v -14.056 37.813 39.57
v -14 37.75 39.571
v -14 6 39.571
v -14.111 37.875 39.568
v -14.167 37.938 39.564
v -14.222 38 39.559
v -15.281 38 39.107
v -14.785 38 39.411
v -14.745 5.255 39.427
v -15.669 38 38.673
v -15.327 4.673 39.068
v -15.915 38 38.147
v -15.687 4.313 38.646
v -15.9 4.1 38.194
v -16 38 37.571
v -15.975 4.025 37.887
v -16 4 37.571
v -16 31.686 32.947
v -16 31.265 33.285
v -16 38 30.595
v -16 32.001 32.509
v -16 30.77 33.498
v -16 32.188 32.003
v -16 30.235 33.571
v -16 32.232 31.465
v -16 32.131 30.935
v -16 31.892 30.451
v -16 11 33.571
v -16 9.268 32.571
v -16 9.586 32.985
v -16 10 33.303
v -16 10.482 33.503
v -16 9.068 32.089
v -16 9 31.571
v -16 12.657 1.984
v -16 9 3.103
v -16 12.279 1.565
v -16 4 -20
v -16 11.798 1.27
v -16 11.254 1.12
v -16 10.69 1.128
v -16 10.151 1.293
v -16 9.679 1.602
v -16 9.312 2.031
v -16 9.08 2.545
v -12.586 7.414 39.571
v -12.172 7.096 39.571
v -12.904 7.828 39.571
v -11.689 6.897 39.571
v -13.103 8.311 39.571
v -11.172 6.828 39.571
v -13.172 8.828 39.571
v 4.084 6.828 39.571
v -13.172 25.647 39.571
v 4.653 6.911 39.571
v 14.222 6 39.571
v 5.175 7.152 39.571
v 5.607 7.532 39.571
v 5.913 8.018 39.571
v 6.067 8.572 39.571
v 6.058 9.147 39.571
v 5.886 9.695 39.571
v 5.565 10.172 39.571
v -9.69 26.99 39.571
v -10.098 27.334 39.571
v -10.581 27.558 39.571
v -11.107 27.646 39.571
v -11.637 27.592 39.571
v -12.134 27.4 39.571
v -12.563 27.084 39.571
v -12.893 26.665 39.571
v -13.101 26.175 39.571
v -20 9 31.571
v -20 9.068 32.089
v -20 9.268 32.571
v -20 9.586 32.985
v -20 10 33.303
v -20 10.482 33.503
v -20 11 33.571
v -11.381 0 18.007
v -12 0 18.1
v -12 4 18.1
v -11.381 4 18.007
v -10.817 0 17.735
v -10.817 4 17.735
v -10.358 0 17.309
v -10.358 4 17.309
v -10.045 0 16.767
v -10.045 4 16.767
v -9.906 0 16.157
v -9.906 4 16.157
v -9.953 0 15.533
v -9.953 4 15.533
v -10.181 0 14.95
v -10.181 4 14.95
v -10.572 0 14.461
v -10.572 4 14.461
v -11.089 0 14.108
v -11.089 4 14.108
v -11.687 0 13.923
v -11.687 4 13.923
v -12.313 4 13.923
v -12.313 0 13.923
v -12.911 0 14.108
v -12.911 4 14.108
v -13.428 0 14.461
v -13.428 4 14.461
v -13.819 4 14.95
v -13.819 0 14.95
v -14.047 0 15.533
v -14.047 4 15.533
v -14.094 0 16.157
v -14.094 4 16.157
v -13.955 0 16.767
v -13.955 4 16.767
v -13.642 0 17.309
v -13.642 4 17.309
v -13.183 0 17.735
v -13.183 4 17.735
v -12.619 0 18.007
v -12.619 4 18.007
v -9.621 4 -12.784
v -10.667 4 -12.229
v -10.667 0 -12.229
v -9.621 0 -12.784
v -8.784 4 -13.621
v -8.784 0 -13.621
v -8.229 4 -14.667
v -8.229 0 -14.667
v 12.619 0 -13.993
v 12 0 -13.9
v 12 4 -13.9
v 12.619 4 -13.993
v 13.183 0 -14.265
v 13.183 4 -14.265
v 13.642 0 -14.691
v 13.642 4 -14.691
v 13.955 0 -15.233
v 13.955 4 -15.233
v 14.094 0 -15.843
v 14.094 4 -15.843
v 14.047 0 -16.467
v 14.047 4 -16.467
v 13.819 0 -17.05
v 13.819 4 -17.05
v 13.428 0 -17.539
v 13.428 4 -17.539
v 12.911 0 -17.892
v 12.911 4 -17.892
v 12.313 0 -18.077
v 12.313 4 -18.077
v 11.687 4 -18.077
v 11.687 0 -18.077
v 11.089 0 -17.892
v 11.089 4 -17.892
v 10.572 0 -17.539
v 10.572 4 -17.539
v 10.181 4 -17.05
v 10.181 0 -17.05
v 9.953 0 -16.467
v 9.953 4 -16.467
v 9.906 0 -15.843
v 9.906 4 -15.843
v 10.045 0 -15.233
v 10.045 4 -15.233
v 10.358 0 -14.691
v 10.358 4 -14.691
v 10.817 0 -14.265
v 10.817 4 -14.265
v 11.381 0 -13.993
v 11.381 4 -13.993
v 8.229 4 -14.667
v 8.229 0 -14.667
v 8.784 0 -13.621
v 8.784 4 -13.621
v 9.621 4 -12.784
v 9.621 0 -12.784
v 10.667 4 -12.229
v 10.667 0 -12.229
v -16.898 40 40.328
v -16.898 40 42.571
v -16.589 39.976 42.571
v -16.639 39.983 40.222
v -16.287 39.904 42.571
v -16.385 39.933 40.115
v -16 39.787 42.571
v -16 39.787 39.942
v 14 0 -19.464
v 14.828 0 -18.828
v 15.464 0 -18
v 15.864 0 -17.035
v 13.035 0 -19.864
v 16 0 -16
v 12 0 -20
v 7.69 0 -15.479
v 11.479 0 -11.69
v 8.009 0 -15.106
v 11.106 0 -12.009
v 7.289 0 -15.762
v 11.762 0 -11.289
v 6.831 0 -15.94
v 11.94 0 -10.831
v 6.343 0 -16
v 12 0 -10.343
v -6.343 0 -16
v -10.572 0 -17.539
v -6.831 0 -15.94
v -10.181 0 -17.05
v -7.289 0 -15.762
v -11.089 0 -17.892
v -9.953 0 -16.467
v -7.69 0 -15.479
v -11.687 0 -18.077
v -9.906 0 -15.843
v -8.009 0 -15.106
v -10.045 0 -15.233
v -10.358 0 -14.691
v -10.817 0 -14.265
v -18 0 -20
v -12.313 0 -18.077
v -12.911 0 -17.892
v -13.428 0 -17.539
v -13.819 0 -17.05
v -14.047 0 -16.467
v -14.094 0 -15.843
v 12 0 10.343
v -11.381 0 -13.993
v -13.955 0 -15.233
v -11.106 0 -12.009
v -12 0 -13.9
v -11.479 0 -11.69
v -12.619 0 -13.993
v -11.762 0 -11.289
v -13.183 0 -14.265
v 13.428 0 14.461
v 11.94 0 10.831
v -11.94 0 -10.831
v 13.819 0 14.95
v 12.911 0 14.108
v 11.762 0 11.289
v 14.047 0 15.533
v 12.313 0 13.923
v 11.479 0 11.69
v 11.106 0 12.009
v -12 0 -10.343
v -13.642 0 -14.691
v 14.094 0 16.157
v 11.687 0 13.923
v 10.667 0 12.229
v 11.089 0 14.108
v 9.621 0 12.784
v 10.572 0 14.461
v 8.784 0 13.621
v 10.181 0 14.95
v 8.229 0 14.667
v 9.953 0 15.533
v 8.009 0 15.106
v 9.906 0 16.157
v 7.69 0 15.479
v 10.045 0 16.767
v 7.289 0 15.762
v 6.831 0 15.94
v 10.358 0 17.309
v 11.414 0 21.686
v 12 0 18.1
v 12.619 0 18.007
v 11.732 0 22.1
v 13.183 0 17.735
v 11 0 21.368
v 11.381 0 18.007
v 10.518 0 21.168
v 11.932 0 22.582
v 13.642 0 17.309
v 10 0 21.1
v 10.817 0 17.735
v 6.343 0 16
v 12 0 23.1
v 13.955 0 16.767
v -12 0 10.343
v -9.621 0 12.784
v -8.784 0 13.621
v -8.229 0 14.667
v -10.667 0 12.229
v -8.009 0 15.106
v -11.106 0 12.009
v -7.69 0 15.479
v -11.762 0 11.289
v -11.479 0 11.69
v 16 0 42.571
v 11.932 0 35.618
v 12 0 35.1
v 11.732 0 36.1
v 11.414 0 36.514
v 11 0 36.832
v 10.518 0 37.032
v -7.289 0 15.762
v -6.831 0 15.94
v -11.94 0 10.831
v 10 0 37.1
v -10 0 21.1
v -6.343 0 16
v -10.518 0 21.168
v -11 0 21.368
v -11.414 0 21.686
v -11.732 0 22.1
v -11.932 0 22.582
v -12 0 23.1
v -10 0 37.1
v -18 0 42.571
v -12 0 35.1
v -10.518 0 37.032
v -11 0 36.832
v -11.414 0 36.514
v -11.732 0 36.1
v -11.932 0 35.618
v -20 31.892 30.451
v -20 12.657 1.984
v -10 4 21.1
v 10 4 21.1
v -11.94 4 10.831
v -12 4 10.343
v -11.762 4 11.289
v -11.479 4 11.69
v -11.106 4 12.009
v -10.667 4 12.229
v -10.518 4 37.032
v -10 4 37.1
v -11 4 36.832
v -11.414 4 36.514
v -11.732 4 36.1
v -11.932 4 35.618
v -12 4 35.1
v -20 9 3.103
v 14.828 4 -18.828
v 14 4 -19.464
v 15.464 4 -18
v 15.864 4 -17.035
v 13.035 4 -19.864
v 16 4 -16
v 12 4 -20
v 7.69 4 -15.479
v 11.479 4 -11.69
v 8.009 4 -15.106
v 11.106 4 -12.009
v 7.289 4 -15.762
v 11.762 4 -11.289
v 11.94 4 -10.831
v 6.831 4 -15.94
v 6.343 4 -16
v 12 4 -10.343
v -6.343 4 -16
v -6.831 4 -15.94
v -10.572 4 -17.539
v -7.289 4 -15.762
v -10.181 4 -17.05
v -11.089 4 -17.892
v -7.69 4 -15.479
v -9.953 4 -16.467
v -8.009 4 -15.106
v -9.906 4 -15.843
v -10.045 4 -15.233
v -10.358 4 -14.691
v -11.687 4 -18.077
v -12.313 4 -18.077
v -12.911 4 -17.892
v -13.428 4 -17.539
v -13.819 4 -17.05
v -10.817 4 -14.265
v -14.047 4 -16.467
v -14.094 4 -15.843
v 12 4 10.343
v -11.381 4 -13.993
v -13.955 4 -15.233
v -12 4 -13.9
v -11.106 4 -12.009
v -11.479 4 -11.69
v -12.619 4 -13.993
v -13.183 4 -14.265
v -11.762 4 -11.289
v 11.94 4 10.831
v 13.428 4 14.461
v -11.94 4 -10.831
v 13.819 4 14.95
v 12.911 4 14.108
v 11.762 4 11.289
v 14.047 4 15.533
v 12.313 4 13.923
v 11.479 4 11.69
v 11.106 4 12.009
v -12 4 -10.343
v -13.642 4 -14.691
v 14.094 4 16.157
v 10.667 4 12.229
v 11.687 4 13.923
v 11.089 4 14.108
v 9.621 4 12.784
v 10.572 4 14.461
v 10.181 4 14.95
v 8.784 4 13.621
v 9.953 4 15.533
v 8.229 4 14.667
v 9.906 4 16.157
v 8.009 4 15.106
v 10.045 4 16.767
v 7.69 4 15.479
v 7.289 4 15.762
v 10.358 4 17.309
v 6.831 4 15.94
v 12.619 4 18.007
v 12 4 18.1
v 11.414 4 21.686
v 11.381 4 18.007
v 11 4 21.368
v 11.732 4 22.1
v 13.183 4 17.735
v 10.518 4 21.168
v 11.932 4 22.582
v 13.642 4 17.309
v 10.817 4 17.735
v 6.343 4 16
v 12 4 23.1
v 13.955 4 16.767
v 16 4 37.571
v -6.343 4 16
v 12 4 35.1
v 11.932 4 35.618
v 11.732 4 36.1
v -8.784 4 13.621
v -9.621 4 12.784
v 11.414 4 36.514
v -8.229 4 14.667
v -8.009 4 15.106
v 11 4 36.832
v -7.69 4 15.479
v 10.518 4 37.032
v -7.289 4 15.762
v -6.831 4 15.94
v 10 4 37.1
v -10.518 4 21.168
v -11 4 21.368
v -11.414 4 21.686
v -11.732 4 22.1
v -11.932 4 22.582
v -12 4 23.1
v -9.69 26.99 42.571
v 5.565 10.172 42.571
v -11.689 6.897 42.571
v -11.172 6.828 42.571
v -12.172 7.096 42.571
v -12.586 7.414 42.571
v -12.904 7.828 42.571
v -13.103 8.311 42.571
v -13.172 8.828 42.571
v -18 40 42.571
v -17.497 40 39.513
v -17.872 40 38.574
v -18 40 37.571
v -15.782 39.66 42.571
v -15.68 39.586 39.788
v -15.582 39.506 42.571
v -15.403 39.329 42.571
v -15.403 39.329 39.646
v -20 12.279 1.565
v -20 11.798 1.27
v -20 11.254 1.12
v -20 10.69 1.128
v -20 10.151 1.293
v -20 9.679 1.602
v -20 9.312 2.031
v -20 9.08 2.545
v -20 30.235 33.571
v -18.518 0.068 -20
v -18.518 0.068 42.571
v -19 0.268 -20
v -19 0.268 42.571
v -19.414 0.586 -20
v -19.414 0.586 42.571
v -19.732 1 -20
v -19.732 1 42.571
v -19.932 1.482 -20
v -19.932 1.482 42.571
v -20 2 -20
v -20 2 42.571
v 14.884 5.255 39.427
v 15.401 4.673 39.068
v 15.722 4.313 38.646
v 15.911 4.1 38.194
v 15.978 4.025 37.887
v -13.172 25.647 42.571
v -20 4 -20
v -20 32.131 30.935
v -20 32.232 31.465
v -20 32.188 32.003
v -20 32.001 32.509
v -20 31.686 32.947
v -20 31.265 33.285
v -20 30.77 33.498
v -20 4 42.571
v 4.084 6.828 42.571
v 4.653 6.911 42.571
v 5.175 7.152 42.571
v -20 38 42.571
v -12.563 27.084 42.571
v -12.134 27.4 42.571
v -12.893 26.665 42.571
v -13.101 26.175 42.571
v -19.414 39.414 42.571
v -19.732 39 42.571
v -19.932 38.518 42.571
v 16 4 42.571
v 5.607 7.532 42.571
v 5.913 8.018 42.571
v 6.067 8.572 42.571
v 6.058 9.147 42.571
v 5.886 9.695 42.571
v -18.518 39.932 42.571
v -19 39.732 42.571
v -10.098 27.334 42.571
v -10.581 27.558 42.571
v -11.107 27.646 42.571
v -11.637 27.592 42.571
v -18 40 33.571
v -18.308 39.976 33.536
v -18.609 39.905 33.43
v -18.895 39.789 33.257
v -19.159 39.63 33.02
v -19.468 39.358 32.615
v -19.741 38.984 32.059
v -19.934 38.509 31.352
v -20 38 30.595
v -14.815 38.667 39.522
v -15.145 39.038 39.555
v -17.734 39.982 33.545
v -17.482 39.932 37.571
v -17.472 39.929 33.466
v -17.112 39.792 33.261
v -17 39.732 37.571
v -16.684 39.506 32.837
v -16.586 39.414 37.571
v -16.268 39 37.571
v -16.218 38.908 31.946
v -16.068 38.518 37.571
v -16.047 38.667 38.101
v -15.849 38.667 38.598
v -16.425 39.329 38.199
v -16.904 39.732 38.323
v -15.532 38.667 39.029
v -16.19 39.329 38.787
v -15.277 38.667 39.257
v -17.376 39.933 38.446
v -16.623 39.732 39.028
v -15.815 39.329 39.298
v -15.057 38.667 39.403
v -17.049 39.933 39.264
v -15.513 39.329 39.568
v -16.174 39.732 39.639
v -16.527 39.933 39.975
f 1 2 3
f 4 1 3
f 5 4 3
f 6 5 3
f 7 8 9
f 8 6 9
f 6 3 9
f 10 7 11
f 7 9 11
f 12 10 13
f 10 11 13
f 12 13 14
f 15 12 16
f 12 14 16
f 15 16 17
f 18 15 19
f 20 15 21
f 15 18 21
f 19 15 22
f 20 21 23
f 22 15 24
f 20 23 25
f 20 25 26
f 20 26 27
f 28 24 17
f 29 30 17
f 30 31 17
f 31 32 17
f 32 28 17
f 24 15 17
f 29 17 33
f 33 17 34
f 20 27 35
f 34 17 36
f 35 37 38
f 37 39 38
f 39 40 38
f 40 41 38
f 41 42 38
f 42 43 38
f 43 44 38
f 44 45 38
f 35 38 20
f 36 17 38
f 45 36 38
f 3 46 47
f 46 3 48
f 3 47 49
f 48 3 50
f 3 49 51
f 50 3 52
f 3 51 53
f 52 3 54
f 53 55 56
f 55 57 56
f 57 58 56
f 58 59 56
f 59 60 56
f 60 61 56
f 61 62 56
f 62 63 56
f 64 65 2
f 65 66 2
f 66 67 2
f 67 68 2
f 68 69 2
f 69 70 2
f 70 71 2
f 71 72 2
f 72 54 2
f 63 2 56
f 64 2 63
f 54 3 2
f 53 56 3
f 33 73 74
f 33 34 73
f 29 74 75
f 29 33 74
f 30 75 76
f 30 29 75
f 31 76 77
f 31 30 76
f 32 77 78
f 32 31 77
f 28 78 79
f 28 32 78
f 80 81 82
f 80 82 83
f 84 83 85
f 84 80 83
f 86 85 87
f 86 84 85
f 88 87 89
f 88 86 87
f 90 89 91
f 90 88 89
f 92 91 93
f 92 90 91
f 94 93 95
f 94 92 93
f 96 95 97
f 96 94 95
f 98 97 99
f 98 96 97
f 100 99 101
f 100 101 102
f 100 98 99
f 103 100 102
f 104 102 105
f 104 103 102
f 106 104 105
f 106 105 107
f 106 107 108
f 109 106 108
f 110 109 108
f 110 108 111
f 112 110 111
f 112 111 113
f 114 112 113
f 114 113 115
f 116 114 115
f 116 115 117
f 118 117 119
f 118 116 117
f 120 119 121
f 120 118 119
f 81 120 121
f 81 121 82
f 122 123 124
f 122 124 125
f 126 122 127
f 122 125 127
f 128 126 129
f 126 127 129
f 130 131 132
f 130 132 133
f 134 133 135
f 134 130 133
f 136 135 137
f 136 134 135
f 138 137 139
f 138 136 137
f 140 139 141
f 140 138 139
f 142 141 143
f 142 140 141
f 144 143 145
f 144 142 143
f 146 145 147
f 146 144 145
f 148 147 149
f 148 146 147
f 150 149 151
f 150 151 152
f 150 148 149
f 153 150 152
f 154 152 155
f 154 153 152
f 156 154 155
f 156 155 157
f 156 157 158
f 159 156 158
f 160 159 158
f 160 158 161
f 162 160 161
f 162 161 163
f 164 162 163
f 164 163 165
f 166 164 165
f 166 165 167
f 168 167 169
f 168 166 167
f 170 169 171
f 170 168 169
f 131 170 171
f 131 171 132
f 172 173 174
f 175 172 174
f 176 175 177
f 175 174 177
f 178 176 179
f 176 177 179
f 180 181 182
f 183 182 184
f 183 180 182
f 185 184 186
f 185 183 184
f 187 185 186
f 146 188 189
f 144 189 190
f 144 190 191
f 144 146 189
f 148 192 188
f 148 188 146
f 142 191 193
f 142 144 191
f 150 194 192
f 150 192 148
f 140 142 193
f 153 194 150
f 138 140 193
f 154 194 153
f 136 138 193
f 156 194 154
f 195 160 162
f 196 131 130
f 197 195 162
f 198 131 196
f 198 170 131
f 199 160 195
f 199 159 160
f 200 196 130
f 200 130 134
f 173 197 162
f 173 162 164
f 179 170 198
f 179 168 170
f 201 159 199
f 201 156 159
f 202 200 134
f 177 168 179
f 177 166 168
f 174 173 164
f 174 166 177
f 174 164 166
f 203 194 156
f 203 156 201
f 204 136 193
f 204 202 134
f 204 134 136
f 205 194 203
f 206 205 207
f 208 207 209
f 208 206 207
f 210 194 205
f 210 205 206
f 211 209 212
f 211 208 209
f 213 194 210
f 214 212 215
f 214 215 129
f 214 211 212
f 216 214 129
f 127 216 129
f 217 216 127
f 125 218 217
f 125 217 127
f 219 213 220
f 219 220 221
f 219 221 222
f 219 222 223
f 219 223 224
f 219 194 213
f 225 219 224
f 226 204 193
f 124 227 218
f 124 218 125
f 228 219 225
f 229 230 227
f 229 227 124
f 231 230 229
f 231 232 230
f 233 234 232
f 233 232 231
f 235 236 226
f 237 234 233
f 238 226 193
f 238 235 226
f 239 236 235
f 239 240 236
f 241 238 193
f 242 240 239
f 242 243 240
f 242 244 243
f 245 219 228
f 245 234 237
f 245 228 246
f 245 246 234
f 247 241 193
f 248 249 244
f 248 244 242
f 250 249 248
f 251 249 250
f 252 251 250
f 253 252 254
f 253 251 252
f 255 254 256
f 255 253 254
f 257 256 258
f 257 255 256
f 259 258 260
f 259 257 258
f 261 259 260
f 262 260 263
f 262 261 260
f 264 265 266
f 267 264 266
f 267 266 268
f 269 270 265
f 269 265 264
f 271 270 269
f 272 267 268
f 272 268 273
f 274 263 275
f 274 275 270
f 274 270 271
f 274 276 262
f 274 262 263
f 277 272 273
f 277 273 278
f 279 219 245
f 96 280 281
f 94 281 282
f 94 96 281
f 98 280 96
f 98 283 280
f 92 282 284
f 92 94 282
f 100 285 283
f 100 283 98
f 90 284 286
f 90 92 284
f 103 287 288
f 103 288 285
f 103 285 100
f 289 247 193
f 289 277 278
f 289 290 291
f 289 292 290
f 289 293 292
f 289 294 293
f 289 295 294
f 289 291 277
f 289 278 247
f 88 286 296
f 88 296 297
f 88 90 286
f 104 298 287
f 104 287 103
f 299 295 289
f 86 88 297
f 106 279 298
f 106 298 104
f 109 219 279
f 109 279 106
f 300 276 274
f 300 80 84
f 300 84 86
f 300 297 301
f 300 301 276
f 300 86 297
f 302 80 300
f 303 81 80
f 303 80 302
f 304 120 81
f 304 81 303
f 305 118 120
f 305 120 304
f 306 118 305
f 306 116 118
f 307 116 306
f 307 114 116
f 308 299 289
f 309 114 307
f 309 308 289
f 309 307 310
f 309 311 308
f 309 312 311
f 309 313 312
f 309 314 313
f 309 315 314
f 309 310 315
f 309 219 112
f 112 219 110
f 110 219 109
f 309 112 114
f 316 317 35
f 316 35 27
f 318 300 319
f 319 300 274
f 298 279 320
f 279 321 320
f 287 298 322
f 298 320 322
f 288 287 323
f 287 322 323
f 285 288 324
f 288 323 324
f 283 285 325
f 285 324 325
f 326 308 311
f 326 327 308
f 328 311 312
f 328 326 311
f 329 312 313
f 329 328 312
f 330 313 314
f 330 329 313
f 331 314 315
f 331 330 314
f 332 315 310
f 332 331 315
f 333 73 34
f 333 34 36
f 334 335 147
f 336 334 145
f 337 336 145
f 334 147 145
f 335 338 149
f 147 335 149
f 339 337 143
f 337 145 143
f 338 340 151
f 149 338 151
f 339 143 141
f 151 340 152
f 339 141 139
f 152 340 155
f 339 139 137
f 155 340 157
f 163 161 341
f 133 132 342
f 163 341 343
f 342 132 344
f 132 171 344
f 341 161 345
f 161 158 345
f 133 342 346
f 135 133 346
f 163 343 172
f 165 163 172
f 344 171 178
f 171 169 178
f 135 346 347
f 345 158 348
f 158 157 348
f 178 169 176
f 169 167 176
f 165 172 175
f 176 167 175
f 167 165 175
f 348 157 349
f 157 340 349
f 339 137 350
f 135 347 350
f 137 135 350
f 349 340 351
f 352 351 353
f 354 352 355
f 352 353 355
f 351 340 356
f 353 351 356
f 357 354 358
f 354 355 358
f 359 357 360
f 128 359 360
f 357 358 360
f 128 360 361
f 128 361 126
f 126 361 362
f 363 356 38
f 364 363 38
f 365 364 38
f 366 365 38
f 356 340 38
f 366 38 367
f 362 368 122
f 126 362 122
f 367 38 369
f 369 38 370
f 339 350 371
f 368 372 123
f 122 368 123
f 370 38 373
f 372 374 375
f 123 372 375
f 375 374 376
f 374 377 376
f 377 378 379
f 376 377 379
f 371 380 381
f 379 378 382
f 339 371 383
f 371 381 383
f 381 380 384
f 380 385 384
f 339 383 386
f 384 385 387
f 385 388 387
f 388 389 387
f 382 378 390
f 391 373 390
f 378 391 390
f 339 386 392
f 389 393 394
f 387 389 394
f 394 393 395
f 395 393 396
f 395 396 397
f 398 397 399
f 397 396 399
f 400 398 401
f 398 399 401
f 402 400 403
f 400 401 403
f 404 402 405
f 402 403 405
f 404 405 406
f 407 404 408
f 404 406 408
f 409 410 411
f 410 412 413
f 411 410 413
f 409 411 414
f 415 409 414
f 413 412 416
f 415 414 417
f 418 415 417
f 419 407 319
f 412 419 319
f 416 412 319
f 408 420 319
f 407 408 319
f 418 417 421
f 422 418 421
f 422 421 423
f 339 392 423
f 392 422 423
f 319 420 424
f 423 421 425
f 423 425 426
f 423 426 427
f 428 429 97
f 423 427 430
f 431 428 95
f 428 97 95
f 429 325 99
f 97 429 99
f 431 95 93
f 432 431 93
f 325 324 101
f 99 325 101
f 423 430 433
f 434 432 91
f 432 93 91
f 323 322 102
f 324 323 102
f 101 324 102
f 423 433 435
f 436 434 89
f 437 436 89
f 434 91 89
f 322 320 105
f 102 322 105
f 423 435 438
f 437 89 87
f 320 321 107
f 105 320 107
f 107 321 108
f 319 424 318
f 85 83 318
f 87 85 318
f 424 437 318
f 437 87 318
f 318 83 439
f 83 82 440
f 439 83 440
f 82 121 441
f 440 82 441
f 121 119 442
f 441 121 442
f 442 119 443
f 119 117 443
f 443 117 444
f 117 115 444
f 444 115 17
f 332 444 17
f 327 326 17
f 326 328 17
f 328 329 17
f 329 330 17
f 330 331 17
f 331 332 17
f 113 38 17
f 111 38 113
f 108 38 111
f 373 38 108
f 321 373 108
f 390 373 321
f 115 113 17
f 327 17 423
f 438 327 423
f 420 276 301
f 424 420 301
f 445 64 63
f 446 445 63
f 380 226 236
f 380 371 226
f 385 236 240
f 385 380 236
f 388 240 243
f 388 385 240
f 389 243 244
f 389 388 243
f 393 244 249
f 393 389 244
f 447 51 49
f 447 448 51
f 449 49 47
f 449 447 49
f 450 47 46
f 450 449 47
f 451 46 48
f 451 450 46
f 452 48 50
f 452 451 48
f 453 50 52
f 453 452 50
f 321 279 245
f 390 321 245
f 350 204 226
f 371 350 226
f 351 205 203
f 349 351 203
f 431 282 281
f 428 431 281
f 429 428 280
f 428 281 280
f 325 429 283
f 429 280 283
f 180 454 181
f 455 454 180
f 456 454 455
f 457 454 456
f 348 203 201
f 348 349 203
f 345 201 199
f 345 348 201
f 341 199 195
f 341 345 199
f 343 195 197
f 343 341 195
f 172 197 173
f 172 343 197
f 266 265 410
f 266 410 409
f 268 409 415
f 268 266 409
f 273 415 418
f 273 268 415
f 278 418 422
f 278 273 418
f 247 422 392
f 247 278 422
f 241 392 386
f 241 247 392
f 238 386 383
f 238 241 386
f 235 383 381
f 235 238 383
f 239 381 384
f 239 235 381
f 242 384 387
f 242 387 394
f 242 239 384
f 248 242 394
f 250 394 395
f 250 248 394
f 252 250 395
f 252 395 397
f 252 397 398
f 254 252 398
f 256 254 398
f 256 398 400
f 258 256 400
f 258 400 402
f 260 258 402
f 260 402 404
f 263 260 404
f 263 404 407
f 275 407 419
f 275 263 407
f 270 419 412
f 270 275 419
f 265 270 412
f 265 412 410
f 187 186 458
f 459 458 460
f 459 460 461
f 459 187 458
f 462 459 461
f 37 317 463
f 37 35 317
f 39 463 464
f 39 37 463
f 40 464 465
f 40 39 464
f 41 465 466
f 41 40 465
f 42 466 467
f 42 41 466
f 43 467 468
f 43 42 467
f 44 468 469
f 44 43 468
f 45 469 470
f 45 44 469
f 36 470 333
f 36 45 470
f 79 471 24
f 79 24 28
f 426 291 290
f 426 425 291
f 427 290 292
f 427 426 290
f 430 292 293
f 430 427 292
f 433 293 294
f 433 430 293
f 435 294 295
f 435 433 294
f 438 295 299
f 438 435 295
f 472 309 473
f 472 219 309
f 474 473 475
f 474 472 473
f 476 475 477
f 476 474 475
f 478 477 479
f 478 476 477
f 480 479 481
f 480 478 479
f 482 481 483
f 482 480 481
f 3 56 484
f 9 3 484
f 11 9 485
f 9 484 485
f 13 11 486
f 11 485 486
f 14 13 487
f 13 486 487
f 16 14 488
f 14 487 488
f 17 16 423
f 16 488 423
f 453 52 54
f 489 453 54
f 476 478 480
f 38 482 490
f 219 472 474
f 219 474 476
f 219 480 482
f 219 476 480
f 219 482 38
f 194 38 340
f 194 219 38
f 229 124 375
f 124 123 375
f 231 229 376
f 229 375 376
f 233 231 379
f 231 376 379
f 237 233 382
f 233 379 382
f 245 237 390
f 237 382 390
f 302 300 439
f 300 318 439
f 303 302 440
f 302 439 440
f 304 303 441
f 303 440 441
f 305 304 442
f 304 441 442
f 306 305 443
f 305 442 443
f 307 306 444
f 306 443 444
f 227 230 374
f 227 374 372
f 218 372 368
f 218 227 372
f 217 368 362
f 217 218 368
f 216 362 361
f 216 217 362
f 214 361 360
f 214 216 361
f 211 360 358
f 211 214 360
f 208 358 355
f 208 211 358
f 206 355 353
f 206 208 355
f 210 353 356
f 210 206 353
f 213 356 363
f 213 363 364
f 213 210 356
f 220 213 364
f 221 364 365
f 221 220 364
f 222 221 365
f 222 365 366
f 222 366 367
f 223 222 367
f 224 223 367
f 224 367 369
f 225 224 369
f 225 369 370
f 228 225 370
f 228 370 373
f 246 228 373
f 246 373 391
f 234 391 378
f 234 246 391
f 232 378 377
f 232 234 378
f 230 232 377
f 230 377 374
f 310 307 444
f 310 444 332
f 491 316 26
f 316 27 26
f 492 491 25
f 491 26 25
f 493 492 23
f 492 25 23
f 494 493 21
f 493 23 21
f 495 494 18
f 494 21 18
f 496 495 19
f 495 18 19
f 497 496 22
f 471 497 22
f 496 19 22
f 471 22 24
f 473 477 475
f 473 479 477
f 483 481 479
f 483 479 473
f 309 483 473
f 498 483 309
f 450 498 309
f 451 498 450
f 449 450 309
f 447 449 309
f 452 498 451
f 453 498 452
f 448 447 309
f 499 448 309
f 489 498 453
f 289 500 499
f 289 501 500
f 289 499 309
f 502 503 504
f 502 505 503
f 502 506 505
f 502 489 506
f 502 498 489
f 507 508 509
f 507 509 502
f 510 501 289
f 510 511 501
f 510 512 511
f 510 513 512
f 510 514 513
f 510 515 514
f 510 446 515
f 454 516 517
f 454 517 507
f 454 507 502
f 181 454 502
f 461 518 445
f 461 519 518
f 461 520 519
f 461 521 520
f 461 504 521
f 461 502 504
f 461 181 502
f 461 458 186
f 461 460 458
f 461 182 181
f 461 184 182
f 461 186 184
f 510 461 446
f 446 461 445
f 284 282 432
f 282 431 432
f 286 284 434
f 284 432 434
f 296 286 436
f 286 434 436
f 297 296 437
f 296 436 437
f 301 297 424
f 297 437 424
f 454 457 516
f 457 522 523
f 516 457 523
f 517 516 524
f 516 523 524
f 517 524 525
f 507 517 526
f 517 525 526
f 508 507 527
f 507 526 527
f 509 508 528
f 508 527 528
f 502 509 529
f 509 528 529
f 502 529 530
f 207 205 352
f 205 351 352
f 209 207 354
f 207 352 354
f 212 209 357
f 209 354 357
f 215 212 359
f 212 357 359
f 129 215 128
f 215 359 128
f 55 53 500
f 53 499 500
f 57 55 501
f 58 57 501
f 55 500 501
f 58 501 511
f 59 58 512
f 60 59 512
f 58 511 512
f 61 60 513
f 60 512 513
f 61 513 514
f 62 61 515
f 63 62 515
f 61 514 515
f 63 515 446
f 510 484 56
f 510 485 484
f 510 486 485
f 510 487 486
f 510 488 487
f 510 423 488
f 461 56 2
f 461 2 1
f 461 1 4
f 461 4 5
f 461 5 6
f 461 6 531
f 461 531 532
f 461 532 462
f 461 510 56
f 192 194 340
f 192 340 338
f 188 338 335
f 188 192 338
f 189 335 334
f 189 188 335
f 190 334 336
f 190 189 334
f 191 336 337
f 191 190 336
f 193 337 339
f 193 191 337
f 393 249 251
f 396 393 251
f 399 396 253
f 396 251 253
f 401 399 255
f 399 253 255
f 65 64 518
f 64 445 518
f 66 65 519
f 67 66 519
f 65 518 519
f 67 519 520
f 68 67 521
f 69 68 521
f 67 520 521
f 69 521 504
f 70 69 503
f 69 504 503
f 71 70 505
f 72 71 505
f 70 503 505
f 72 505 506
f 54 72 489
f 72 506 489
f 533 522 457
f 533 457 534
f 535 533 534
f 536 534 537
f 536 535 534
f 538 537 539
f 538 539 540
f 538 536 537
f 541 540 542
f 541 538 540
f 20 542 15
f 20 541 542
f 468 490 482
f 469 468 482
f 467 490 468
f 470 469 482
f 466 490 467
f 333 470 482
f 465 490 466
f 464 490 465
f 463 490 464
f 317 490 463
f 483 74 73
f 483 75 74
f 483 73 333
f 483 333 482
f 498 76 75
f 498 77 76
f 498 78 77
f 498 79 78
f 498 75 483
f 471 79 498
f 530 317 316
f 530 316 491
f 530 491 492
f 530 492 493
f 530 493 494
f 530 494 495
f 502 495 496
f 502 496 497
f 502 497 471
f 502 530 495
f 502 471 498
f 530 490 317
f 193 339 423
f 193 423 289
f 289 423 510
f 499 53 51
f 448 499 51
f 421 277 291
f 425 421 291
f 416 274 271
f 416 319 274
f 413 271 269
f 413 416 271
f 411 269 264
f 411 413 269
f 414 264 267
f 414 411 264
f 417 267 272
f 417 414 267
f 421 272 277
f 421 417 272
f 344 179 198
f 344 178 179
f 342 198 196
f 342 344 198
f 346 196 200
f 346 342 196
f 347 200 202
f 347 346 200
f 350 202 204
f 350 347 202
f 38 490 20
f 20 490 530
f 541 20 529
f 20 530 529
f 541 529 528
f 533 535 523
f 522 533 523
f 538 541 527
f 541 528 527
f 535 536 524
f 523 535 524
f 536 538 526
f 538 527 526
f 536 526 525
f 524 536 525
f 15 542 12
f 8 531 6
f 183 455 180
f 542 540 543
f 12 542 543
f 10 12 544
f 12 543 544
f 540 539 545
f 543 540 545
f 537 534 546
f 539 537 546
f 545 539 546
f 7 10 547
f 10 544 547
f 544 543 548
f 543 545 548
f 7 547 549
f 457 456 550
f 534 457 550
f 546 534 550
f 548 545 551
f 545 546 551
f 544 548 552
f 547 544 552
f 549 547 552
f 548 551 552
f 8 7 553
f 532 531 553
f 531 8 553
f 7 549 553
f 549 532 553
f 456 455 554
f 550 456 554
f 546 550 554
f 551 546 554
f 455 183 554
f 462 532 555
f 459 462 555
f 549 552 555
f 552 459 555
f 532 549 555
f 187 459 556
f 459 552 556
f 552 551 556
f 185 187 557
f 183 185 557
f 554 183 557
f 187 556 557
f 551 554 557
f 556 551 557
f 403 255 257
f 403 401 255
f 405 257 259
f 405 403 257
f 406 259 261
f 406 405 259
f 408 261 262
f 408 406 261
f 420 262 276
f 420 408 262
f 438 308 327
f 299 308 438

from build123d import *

# Parameters (mm, degrees)
SKETCH1_R           = 2.1
BOSS_EXTRUDE1_DEPTH = 4
SKETCH2_W           = 4
SKETCH2_H           = 79.366859707
BOSS_EXTRUDE2_DEPTH = 36
SKETCH3_W           = 16.795845367
SKETCH3_H           = 36
CUT_EXTRUDE1_DEPTH  = 20
SKETCH4_W           = 16
SKETCH4_H           = 4
BOSS_EXTRUDE3_DEPTH = 36
CUT_EXTRUDE2_DEPTH  = 20
BOSS_EXTRUDE4_DEPTH = 3
CUT_EXTRUDE3_DEPTH  = 3
SKETCH9_W           = 24
SKETCH9_H           = 16
CUT_EXTRUDE5_DEPTH  = 4
FILLET1_R           = 2
FILLET2_R           = 2
FILLET3_START       = -20
FILLET3_DEPTH       = 57.57101424
FILLET3_START_2     = 35.417415549
FILLET3_2_DEPTH     = 8.582584451
FILLET3_START_3     = 39
FILLET3_4_DEPTH     = 5


with BuildPart() as part:
    # Sketch1 → Boss-Extrude1 (new body)
    with BuildSketch(Plane(origin=(0, 0, 0), x_dir=(1, 0, 0), z_dir=(0, 1, 0))):
        with BuildLine():
            Line((-12, 20), (12, 20))
            ThreePointArc((12, 20), (14.828427125, 18.828427125), (16, 16))
            Line((16, 16), (16, -16))
            Line((16, -16), (16, -26.57101434))
            Line((16, -26.57101434), (-16, -26.57101434))
            Line((-16, -26.57101434), (-20, -26.57101434))
            Line((-20, -26.57101434), (-20, 20))
            Line((-20, 20), (-12, 20))
        make_face()
        with Locations(Location((-12, 16, 0), (0, 0, 270))):
            Circle(SKETCH1_R, mode=Mode.SUBTRACT)
        with Locations(Location((12, 16, 0), (0, 0, 270))):
            Circle(SKETCH1_R, mode=Mode.SUBTRACT)
        with Locations(Location((12, -16, 0), (0, 0, 270))):
            Circle(SKETCH1_R, mode=Mode.SUBTRACT)
        with Locations(Location((-12, -16, 0), (0, 0, 270))):
            Circle(SKETCH1_R, mode=Mode.SUBTRACT)
        with BuildLine():
            Line((-8, 16), (8, 16))
            ThreePointArc((8, 16), (9.171572875, 13.171572875), (12, 12))
            Line((12, 12), (12, -12))
            ThreePointArc((12, -12), (9.171572875, -13.171572875), (8, -16))
            Line((8, -16), (-8, -16))
            ThreePointArc((-8, -16), (-9.171572875, -13.171572875), (-12, -12))
            Line((-12, -12), (-12, 12))
            ThreePointArc((-12, 12), (-9.171572875, 13.171572875), (-8, 16))
        make_face(mode=Mode.SUBTRACT)
    extrude(amount=BOSS_EXTRUDE1_DEPTH)

    # Sketch2 → Boss-Extrude2 (add)
    with BuildSketch(Plane(origin=(0, 4, 0), x_dir=(1, 0, 0), z_dir=(0, 1, 0))):
        with Locations((-18, -19.683429854)):
            Rectangle(SKETCH2_W, SKETCH2_H)
    extrude(amount=BOSS_EXTRUDE2_DEPTH)

    # Sketch3 → Cut-Extrude1 (cut)
    with BuildSketch(Plane.ZY.offset(20)):
        Polygon((-20, 4), (33.57101434, 40), (-20, 40), align=None)
        with Locations((50.968937024, 22)):
            Rectangle(SKETCH3_W, SKETCH3_H)
    extrude(amount=-CUT_EXTRUDE1_DEPTH, mode=Mode.SUBTRACT)

    # Sketch4 → Boss-Extrude3 (add)
    with BuildSketch(Plane.ZY.offset(20)):
        with Locations((34.57101434, 2)):
            Rectangle(SKETCH4_W, SKETCH4_H)
    extrude(amount=-BOSS_EXTRUDE3_DEPTH)

    # Sketch5 → Cut-Extrude2 (cut)
    with BuildSketch(Plane.ZY.offset(20)):
        Polygon((33.57101434, 34), (33.57101434, 9), (-3.42898566, 9), align=None)
    extrude(amount=-CUT_EXTRUDE2_DEPTH, mode=Mode.SUBTRACT)

    # Sketch6 → Boss-Extrude4 (add)
    with BuildSketch(Plane.XY.offset(42.57101434)):
        Polygon((-16, 40), (-16, 4), (16, 4), align=None)
    extrude(amount=-BOSS_EXTRUDE4_DEPTH)

    # Sketch7 → Cut-Extrude3 (cut)
    with BuildSketch(Plane(origin=(0, 0, 39.57101434), x_dir=(-1, 0, 0), z_dir=(0, 0, -1))):
        Polygon((13.171572875, 6.828427125), (13.171572875, 30.828427125), (-8.598354134, 6.828427125), align=None)
    extrude(amount=-CUT_EXTRUDE3_DEPTH, mode=Mode.SUBTRACT)

    # Sketch9 → Cut-Extrude5 (cut)
    with BuildSketch(Plane.XZ):
        with Locations((0, 29.1)):
            Rectangle(SKETCH9_W, SKETCH9_H)
    extrude(amount=-CUT_EXTRUDE5_DEPTH, mode=Mode.SUBTRACT)

    # Fillet1
    fillet1_edges = [part.edges().sort_by_distance(p)[0] for p in [
        (-18, 9, -3.42898566),
        (-18, 34, 33.57101434),
        (-18, 9, 33.57101434),
        (-13.171572875, 6.828427125, 41.07101434),
        (8.598354134, 6.828427125, 41.07101434),
        (-13.171572875, 30.828427125, 41.07101434),
        (12, 2, 37.1),
        (12, 2, 21.1),
        (-12, 2, 21.1),
        (-12, 2, 37.1),
        (-8, 2, -16),
        (-12, 2, -12),
        (-12, 2, 12),
        (-8, 2, 16),
        (8, 2, 16),
        (12, 2, 12),
        (12, 2, -12),
        (8, 2, -16),
    ]]
    fillet(fillet1_edges, radius=FILLET1_R)

    # Fillet2
    fillet2_edges = [part.edges().sort_by_distance(p)[0] for p in [
        (-20, 0, 11.28550717),
        (0, 4, 39.57101434),
        (-16, 22, 39.57101434),
        (-20, 40, 38.07101434),
    ]]
    fillet(fillet2_edges, radius=FILLET2_R)

    # Fillet3: read off the stored shape, not the designer's step
    # Fillet3 outline → Fillet3 (cut)
    with BuildSketch(Plane.XY.offset(FILLET3_START)):
        with BuildLine():
            ThreePointArc((-18, 40), (-16.585786438, 39.414213562), (-16, 38))
            Line((-16, 38), (-16, 40))
            Line((-16, 40), (-18, 40))
        make_face()
    extrude(amount=FILLET3_DEPTH, mode=Mode.SUBTRACT)

    # Fillet3 2 outline → Fillet3 2 (cut)
    with BuildSketch(Plane.XY.offset(FILLET3_START_2)):
        with BuildLine():
            Line((-16, 40), (-16.898132129, 40))
            ThreePointArc((-16.898132129, 40), (-16.43660977, 39.946020841), (-16, 39.786997113))
            Line((-16, 39.786997113), (-16, 40))
        make_face()
    extrude(amount=FILLET3_2_DEPTH, mode=Mode.SUBTRACT)

    # Fillet3 3 outline → Fillet3 3 (revolve, cut)
    with BuildSketch(Plane(origin=(-14, 0, 37.57101434), x_dir=(1, 0, 0), z_dir=(0, 0, 1))):
        with BuildLine():
            Line((2, 40), (2, 38))
            ThreePointArc((2, 38), (2.585786438, 39.414213562), (4, 40))
            Line((4, 40), (2, 40))
        make_face()
    revolve(axis=Axis((-14, 0, 37.57101434), (0, 1, 0)), mode=Mode.SUBTRACT)

    # Fillet3 4 outline → Fillet3 4 (cut)
    with BuildSketch(Plane.XY.offset(FILLET3_START_3)):
        with BuildLine():
            ThreePointArc((-16, 39.786997113), (-15.679913732, 39.586172734), (-15.403313491, 39.328727678))
            Line((-15.403313491, 39.328727678), (-16, 40))
            Line((-16, 40), (-16, 39.786997113))
        make_face()
    extrude(amount=FILLET3_4_DEPTH, mode=Mode.SUBTRACT)


solid = part.part
